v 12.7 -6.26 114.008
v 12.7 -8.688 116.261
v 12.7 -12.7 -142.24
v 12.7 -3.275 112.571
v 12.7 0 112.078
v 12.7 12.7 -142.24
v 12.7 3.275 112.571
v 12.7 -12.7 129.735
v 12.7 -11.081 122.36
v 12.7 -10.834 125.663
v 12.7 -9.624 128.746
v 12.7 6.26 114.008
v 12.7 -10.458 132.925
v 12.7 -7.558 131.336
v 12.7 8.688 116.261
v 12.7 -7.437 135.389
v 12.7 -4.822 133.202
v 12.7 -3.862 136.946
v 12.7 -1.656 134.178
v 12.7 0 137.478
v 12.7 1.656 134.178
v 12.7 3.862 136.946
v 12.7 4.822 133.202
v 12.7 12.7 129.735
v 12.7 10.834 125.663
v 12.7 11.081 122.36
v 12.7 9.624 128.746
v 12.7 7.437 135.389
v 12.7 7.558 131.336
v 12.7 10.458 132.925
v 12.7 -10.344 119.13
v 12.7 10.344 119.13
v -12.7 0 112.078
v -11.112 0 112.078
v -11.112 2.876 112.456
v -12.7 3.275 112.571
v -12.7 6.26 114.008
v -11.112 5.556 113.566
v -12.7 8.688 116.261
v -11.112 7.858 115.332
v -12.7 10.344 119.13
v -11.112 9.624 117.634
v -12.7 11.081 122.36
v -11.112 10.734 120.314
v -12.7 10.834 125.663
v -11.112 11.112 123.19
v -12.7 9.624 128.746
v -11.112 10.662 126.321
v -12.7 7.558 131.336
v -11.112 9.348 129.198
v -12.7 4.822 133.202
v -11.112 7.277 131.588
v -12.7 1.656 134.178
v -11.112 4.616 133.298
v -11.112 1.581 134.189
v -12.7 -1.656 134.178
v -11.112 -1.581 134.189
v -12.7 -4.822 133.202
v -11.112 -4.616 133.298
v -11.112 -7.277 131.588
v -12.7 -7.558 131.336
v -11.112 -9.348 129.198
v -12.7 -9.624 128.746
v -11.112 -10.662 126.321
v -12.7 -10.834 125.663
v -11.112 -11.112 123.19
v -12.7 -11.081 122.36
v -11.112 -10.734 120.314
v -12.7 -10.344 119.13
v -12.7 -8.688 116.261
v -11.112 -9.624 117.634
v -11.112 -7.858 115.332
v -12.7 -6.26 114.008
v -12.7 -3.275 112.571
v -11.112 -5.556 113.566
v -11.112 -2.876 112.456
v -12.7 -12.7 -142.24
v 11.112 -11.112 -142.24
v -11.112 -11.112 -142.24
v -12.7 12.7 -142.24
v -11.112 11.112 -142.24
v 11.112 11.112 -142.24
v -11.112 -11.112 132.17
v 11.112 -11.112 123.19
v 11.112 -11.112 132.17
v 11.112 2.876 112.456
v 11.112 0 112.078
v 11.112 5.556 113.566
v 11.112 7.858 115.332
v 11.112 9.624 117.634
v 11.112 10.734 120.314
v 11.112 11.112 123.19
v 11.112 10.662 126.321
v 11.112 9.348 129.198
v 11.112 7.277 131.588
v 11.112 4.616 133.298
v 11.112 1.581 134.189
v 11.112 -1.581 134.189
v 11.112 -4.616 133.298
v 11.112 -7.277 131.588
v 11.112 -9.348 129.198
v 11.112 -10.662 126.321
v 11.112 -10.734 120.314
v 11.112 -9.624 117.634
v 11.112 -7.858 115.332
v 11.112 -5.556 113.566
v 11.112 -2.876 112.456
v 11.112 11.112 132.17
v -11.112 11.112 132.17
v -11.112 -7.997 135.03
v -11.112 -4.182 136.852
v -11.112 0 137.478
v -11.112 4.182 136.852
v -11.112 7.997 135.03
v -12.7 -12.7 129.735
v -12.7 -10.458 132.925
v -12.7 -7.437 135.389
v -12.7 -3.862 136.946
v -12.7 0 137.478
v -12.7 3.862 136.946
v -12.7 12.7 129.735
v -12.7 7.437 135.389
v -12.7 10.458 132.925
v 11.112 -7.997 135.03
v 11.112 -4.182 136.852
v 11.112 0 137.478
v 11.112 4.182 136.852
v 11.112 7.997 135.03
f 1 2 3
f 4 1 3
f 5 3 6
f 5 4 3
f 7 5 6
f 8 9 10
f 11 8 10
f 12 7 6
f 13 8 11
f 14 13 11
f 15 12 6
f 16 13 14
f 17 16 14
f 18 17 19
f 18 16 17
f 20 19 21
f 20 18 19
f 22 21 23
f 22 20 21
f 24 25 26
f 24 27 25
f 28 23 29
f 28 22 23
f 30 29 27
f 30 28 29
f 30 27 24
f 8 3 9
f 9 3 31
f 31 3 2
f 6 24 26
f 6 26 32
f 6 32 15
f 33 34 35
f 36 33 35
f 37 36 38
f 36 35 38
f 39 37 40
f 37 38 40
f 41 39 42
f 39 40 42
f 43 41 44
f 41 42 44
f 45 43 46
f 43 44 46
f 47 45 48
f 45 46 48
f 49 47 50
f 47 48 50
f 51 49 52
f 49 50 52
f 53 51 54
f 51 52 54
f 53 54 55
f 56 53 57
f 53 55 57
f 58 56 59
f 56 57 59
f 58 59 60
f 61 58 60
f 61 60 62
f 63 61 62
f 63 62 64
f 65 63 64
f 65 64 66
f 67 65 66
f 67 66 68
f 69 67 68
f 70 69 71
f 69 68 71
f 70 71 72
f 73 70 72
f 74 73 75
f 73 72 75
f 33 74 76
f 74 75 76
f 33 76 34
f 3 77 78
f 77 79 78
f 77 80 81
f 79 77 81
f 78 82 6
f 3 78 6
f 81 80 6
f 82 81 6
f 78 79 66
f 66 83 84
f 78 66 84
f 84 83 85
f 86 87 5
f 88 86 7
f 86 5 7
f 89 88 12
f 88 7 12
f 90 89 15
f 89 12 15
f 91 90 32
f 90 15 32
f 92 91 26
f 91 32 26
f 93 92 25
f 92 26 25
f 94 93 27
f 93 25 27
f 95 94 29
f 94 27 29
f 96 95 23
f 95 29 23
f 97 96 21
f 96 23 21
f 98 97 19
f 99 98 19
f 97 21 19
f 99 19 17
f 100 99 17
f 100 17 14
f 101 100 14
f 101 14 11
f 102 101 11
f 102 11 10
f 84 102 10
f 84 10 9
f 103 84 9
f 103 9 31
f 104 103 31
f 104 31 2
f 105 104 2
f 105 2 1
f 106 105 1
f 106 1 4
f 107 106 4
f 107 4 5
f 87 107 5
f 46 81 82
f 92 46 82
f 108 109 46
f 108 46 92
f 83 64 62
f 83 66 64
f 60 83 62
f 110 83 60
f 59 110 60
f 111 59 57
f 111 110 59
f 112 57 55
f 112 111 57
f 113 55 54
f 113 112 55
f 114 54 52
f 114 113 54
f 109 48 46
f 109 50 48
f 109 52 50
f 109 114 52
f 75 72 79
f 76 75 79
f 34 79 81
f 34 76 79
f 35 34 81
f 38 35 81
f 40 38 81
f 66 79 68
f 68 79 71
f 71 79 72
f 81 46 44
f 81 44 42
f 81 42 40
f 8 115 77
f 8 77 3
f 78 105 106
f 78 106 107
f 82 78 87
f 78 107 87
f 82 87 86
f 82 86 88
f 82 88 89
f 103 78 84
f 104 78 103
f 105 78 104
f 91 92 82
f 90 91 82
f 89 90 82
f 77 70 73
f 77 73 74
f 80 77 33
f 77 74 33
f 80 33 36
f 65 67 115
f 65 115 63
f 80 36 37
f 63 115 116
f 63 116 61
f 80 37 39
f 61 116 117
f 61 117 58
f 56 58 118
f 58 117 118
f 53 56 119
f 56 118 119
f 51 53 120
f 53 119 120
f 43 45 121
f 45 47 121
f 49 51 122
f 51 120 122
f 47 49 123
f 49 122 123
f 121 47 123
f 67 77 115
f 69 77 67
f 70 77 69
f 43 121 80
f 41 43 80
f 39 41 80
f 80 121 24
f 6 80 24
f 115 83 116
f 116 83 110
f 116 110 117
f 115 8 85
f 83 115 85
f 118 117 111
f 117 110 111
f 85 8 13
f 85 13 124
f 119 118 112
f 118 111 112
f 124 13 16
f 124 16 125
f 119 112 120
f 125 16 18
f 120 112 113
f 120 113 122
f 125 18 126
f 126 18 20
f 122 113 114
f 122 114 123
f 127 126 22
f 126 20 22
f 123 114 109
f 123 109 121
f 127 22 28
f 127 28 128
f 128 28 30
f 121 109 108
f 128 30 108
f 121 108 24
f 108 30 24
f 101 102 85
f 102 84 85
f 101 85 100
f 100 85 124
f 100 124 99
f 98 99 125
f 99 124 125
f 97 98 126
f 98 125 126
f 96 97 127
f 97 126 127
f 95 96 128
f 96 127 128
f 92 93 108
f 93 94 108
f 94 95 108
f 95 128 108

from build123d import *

# Parameters (mm, degrees)
SKETCH1_W           = 25.4
SKETCH1_H           = 25.4
SKETCH1_W_2         = 22.225
SKETCH1_H_2         = 22.225
EXTRUDE_THIN1_DEPTH = 142.24
SKETCH2_R           = 11.1125
CUT_EXTRUDE1_DEPTH  = 146.047121998
CUT_EXTRUDE2_DEPTH  = 146.047121998


with BuildPart() as part:
    # Sketch1 → Extrude-Thin1 (new, symmetric)
    with BuildSketch(Plane.XY):
        Rectangle(SKETCH1_W, SKETCH1_H)
        Rectangle(SKETCH1_W_2, SKETCH1_H_2, mode=Mode.SUBTRACT)
    extrude(amount=EXTRUDE_THIN1_DEPTH, both=True)

    # Sketch2 → Cut-Extrude1 (cut, through all)
    with BuildSketch(Plane(origin=(12.7, 0, 0), x_dir=(0, 0, -1), z_dir=(1, 0, 0))):
        with Locations((-123.19, 0)):
            Circle(SKETCH2_R)
    extrude(amount=-CUT_EXTRUDE1_DEPTH, mode=Mode.SUBTRACT)

    # Sketch3 → Cut-Extrude2 (cut, through all)
    with BuildSketch(Plane(origin=(12.7, 0, 0), x_dir=(0, 0, -1), z_dir=(1, 0, 0))):
        with BuildLine():
            Line((-123.19, 14.2875), (-142.24, 14.2875))
            Line((-142.24, 14.2875), (-142.24, -12.7))
            Line((-142.24, -12.7), (-129.735430181, -12.7))
            ThreePointArc((-129.735430181, -12.7), (-137.0749542, 3.367596045), (-123.19, 14.2875))
        make_face()
    extrude(amount=-CUT_EXTRUDE2_DEPTH, mode=Mode.SUBTRACT)


solid = part.part
